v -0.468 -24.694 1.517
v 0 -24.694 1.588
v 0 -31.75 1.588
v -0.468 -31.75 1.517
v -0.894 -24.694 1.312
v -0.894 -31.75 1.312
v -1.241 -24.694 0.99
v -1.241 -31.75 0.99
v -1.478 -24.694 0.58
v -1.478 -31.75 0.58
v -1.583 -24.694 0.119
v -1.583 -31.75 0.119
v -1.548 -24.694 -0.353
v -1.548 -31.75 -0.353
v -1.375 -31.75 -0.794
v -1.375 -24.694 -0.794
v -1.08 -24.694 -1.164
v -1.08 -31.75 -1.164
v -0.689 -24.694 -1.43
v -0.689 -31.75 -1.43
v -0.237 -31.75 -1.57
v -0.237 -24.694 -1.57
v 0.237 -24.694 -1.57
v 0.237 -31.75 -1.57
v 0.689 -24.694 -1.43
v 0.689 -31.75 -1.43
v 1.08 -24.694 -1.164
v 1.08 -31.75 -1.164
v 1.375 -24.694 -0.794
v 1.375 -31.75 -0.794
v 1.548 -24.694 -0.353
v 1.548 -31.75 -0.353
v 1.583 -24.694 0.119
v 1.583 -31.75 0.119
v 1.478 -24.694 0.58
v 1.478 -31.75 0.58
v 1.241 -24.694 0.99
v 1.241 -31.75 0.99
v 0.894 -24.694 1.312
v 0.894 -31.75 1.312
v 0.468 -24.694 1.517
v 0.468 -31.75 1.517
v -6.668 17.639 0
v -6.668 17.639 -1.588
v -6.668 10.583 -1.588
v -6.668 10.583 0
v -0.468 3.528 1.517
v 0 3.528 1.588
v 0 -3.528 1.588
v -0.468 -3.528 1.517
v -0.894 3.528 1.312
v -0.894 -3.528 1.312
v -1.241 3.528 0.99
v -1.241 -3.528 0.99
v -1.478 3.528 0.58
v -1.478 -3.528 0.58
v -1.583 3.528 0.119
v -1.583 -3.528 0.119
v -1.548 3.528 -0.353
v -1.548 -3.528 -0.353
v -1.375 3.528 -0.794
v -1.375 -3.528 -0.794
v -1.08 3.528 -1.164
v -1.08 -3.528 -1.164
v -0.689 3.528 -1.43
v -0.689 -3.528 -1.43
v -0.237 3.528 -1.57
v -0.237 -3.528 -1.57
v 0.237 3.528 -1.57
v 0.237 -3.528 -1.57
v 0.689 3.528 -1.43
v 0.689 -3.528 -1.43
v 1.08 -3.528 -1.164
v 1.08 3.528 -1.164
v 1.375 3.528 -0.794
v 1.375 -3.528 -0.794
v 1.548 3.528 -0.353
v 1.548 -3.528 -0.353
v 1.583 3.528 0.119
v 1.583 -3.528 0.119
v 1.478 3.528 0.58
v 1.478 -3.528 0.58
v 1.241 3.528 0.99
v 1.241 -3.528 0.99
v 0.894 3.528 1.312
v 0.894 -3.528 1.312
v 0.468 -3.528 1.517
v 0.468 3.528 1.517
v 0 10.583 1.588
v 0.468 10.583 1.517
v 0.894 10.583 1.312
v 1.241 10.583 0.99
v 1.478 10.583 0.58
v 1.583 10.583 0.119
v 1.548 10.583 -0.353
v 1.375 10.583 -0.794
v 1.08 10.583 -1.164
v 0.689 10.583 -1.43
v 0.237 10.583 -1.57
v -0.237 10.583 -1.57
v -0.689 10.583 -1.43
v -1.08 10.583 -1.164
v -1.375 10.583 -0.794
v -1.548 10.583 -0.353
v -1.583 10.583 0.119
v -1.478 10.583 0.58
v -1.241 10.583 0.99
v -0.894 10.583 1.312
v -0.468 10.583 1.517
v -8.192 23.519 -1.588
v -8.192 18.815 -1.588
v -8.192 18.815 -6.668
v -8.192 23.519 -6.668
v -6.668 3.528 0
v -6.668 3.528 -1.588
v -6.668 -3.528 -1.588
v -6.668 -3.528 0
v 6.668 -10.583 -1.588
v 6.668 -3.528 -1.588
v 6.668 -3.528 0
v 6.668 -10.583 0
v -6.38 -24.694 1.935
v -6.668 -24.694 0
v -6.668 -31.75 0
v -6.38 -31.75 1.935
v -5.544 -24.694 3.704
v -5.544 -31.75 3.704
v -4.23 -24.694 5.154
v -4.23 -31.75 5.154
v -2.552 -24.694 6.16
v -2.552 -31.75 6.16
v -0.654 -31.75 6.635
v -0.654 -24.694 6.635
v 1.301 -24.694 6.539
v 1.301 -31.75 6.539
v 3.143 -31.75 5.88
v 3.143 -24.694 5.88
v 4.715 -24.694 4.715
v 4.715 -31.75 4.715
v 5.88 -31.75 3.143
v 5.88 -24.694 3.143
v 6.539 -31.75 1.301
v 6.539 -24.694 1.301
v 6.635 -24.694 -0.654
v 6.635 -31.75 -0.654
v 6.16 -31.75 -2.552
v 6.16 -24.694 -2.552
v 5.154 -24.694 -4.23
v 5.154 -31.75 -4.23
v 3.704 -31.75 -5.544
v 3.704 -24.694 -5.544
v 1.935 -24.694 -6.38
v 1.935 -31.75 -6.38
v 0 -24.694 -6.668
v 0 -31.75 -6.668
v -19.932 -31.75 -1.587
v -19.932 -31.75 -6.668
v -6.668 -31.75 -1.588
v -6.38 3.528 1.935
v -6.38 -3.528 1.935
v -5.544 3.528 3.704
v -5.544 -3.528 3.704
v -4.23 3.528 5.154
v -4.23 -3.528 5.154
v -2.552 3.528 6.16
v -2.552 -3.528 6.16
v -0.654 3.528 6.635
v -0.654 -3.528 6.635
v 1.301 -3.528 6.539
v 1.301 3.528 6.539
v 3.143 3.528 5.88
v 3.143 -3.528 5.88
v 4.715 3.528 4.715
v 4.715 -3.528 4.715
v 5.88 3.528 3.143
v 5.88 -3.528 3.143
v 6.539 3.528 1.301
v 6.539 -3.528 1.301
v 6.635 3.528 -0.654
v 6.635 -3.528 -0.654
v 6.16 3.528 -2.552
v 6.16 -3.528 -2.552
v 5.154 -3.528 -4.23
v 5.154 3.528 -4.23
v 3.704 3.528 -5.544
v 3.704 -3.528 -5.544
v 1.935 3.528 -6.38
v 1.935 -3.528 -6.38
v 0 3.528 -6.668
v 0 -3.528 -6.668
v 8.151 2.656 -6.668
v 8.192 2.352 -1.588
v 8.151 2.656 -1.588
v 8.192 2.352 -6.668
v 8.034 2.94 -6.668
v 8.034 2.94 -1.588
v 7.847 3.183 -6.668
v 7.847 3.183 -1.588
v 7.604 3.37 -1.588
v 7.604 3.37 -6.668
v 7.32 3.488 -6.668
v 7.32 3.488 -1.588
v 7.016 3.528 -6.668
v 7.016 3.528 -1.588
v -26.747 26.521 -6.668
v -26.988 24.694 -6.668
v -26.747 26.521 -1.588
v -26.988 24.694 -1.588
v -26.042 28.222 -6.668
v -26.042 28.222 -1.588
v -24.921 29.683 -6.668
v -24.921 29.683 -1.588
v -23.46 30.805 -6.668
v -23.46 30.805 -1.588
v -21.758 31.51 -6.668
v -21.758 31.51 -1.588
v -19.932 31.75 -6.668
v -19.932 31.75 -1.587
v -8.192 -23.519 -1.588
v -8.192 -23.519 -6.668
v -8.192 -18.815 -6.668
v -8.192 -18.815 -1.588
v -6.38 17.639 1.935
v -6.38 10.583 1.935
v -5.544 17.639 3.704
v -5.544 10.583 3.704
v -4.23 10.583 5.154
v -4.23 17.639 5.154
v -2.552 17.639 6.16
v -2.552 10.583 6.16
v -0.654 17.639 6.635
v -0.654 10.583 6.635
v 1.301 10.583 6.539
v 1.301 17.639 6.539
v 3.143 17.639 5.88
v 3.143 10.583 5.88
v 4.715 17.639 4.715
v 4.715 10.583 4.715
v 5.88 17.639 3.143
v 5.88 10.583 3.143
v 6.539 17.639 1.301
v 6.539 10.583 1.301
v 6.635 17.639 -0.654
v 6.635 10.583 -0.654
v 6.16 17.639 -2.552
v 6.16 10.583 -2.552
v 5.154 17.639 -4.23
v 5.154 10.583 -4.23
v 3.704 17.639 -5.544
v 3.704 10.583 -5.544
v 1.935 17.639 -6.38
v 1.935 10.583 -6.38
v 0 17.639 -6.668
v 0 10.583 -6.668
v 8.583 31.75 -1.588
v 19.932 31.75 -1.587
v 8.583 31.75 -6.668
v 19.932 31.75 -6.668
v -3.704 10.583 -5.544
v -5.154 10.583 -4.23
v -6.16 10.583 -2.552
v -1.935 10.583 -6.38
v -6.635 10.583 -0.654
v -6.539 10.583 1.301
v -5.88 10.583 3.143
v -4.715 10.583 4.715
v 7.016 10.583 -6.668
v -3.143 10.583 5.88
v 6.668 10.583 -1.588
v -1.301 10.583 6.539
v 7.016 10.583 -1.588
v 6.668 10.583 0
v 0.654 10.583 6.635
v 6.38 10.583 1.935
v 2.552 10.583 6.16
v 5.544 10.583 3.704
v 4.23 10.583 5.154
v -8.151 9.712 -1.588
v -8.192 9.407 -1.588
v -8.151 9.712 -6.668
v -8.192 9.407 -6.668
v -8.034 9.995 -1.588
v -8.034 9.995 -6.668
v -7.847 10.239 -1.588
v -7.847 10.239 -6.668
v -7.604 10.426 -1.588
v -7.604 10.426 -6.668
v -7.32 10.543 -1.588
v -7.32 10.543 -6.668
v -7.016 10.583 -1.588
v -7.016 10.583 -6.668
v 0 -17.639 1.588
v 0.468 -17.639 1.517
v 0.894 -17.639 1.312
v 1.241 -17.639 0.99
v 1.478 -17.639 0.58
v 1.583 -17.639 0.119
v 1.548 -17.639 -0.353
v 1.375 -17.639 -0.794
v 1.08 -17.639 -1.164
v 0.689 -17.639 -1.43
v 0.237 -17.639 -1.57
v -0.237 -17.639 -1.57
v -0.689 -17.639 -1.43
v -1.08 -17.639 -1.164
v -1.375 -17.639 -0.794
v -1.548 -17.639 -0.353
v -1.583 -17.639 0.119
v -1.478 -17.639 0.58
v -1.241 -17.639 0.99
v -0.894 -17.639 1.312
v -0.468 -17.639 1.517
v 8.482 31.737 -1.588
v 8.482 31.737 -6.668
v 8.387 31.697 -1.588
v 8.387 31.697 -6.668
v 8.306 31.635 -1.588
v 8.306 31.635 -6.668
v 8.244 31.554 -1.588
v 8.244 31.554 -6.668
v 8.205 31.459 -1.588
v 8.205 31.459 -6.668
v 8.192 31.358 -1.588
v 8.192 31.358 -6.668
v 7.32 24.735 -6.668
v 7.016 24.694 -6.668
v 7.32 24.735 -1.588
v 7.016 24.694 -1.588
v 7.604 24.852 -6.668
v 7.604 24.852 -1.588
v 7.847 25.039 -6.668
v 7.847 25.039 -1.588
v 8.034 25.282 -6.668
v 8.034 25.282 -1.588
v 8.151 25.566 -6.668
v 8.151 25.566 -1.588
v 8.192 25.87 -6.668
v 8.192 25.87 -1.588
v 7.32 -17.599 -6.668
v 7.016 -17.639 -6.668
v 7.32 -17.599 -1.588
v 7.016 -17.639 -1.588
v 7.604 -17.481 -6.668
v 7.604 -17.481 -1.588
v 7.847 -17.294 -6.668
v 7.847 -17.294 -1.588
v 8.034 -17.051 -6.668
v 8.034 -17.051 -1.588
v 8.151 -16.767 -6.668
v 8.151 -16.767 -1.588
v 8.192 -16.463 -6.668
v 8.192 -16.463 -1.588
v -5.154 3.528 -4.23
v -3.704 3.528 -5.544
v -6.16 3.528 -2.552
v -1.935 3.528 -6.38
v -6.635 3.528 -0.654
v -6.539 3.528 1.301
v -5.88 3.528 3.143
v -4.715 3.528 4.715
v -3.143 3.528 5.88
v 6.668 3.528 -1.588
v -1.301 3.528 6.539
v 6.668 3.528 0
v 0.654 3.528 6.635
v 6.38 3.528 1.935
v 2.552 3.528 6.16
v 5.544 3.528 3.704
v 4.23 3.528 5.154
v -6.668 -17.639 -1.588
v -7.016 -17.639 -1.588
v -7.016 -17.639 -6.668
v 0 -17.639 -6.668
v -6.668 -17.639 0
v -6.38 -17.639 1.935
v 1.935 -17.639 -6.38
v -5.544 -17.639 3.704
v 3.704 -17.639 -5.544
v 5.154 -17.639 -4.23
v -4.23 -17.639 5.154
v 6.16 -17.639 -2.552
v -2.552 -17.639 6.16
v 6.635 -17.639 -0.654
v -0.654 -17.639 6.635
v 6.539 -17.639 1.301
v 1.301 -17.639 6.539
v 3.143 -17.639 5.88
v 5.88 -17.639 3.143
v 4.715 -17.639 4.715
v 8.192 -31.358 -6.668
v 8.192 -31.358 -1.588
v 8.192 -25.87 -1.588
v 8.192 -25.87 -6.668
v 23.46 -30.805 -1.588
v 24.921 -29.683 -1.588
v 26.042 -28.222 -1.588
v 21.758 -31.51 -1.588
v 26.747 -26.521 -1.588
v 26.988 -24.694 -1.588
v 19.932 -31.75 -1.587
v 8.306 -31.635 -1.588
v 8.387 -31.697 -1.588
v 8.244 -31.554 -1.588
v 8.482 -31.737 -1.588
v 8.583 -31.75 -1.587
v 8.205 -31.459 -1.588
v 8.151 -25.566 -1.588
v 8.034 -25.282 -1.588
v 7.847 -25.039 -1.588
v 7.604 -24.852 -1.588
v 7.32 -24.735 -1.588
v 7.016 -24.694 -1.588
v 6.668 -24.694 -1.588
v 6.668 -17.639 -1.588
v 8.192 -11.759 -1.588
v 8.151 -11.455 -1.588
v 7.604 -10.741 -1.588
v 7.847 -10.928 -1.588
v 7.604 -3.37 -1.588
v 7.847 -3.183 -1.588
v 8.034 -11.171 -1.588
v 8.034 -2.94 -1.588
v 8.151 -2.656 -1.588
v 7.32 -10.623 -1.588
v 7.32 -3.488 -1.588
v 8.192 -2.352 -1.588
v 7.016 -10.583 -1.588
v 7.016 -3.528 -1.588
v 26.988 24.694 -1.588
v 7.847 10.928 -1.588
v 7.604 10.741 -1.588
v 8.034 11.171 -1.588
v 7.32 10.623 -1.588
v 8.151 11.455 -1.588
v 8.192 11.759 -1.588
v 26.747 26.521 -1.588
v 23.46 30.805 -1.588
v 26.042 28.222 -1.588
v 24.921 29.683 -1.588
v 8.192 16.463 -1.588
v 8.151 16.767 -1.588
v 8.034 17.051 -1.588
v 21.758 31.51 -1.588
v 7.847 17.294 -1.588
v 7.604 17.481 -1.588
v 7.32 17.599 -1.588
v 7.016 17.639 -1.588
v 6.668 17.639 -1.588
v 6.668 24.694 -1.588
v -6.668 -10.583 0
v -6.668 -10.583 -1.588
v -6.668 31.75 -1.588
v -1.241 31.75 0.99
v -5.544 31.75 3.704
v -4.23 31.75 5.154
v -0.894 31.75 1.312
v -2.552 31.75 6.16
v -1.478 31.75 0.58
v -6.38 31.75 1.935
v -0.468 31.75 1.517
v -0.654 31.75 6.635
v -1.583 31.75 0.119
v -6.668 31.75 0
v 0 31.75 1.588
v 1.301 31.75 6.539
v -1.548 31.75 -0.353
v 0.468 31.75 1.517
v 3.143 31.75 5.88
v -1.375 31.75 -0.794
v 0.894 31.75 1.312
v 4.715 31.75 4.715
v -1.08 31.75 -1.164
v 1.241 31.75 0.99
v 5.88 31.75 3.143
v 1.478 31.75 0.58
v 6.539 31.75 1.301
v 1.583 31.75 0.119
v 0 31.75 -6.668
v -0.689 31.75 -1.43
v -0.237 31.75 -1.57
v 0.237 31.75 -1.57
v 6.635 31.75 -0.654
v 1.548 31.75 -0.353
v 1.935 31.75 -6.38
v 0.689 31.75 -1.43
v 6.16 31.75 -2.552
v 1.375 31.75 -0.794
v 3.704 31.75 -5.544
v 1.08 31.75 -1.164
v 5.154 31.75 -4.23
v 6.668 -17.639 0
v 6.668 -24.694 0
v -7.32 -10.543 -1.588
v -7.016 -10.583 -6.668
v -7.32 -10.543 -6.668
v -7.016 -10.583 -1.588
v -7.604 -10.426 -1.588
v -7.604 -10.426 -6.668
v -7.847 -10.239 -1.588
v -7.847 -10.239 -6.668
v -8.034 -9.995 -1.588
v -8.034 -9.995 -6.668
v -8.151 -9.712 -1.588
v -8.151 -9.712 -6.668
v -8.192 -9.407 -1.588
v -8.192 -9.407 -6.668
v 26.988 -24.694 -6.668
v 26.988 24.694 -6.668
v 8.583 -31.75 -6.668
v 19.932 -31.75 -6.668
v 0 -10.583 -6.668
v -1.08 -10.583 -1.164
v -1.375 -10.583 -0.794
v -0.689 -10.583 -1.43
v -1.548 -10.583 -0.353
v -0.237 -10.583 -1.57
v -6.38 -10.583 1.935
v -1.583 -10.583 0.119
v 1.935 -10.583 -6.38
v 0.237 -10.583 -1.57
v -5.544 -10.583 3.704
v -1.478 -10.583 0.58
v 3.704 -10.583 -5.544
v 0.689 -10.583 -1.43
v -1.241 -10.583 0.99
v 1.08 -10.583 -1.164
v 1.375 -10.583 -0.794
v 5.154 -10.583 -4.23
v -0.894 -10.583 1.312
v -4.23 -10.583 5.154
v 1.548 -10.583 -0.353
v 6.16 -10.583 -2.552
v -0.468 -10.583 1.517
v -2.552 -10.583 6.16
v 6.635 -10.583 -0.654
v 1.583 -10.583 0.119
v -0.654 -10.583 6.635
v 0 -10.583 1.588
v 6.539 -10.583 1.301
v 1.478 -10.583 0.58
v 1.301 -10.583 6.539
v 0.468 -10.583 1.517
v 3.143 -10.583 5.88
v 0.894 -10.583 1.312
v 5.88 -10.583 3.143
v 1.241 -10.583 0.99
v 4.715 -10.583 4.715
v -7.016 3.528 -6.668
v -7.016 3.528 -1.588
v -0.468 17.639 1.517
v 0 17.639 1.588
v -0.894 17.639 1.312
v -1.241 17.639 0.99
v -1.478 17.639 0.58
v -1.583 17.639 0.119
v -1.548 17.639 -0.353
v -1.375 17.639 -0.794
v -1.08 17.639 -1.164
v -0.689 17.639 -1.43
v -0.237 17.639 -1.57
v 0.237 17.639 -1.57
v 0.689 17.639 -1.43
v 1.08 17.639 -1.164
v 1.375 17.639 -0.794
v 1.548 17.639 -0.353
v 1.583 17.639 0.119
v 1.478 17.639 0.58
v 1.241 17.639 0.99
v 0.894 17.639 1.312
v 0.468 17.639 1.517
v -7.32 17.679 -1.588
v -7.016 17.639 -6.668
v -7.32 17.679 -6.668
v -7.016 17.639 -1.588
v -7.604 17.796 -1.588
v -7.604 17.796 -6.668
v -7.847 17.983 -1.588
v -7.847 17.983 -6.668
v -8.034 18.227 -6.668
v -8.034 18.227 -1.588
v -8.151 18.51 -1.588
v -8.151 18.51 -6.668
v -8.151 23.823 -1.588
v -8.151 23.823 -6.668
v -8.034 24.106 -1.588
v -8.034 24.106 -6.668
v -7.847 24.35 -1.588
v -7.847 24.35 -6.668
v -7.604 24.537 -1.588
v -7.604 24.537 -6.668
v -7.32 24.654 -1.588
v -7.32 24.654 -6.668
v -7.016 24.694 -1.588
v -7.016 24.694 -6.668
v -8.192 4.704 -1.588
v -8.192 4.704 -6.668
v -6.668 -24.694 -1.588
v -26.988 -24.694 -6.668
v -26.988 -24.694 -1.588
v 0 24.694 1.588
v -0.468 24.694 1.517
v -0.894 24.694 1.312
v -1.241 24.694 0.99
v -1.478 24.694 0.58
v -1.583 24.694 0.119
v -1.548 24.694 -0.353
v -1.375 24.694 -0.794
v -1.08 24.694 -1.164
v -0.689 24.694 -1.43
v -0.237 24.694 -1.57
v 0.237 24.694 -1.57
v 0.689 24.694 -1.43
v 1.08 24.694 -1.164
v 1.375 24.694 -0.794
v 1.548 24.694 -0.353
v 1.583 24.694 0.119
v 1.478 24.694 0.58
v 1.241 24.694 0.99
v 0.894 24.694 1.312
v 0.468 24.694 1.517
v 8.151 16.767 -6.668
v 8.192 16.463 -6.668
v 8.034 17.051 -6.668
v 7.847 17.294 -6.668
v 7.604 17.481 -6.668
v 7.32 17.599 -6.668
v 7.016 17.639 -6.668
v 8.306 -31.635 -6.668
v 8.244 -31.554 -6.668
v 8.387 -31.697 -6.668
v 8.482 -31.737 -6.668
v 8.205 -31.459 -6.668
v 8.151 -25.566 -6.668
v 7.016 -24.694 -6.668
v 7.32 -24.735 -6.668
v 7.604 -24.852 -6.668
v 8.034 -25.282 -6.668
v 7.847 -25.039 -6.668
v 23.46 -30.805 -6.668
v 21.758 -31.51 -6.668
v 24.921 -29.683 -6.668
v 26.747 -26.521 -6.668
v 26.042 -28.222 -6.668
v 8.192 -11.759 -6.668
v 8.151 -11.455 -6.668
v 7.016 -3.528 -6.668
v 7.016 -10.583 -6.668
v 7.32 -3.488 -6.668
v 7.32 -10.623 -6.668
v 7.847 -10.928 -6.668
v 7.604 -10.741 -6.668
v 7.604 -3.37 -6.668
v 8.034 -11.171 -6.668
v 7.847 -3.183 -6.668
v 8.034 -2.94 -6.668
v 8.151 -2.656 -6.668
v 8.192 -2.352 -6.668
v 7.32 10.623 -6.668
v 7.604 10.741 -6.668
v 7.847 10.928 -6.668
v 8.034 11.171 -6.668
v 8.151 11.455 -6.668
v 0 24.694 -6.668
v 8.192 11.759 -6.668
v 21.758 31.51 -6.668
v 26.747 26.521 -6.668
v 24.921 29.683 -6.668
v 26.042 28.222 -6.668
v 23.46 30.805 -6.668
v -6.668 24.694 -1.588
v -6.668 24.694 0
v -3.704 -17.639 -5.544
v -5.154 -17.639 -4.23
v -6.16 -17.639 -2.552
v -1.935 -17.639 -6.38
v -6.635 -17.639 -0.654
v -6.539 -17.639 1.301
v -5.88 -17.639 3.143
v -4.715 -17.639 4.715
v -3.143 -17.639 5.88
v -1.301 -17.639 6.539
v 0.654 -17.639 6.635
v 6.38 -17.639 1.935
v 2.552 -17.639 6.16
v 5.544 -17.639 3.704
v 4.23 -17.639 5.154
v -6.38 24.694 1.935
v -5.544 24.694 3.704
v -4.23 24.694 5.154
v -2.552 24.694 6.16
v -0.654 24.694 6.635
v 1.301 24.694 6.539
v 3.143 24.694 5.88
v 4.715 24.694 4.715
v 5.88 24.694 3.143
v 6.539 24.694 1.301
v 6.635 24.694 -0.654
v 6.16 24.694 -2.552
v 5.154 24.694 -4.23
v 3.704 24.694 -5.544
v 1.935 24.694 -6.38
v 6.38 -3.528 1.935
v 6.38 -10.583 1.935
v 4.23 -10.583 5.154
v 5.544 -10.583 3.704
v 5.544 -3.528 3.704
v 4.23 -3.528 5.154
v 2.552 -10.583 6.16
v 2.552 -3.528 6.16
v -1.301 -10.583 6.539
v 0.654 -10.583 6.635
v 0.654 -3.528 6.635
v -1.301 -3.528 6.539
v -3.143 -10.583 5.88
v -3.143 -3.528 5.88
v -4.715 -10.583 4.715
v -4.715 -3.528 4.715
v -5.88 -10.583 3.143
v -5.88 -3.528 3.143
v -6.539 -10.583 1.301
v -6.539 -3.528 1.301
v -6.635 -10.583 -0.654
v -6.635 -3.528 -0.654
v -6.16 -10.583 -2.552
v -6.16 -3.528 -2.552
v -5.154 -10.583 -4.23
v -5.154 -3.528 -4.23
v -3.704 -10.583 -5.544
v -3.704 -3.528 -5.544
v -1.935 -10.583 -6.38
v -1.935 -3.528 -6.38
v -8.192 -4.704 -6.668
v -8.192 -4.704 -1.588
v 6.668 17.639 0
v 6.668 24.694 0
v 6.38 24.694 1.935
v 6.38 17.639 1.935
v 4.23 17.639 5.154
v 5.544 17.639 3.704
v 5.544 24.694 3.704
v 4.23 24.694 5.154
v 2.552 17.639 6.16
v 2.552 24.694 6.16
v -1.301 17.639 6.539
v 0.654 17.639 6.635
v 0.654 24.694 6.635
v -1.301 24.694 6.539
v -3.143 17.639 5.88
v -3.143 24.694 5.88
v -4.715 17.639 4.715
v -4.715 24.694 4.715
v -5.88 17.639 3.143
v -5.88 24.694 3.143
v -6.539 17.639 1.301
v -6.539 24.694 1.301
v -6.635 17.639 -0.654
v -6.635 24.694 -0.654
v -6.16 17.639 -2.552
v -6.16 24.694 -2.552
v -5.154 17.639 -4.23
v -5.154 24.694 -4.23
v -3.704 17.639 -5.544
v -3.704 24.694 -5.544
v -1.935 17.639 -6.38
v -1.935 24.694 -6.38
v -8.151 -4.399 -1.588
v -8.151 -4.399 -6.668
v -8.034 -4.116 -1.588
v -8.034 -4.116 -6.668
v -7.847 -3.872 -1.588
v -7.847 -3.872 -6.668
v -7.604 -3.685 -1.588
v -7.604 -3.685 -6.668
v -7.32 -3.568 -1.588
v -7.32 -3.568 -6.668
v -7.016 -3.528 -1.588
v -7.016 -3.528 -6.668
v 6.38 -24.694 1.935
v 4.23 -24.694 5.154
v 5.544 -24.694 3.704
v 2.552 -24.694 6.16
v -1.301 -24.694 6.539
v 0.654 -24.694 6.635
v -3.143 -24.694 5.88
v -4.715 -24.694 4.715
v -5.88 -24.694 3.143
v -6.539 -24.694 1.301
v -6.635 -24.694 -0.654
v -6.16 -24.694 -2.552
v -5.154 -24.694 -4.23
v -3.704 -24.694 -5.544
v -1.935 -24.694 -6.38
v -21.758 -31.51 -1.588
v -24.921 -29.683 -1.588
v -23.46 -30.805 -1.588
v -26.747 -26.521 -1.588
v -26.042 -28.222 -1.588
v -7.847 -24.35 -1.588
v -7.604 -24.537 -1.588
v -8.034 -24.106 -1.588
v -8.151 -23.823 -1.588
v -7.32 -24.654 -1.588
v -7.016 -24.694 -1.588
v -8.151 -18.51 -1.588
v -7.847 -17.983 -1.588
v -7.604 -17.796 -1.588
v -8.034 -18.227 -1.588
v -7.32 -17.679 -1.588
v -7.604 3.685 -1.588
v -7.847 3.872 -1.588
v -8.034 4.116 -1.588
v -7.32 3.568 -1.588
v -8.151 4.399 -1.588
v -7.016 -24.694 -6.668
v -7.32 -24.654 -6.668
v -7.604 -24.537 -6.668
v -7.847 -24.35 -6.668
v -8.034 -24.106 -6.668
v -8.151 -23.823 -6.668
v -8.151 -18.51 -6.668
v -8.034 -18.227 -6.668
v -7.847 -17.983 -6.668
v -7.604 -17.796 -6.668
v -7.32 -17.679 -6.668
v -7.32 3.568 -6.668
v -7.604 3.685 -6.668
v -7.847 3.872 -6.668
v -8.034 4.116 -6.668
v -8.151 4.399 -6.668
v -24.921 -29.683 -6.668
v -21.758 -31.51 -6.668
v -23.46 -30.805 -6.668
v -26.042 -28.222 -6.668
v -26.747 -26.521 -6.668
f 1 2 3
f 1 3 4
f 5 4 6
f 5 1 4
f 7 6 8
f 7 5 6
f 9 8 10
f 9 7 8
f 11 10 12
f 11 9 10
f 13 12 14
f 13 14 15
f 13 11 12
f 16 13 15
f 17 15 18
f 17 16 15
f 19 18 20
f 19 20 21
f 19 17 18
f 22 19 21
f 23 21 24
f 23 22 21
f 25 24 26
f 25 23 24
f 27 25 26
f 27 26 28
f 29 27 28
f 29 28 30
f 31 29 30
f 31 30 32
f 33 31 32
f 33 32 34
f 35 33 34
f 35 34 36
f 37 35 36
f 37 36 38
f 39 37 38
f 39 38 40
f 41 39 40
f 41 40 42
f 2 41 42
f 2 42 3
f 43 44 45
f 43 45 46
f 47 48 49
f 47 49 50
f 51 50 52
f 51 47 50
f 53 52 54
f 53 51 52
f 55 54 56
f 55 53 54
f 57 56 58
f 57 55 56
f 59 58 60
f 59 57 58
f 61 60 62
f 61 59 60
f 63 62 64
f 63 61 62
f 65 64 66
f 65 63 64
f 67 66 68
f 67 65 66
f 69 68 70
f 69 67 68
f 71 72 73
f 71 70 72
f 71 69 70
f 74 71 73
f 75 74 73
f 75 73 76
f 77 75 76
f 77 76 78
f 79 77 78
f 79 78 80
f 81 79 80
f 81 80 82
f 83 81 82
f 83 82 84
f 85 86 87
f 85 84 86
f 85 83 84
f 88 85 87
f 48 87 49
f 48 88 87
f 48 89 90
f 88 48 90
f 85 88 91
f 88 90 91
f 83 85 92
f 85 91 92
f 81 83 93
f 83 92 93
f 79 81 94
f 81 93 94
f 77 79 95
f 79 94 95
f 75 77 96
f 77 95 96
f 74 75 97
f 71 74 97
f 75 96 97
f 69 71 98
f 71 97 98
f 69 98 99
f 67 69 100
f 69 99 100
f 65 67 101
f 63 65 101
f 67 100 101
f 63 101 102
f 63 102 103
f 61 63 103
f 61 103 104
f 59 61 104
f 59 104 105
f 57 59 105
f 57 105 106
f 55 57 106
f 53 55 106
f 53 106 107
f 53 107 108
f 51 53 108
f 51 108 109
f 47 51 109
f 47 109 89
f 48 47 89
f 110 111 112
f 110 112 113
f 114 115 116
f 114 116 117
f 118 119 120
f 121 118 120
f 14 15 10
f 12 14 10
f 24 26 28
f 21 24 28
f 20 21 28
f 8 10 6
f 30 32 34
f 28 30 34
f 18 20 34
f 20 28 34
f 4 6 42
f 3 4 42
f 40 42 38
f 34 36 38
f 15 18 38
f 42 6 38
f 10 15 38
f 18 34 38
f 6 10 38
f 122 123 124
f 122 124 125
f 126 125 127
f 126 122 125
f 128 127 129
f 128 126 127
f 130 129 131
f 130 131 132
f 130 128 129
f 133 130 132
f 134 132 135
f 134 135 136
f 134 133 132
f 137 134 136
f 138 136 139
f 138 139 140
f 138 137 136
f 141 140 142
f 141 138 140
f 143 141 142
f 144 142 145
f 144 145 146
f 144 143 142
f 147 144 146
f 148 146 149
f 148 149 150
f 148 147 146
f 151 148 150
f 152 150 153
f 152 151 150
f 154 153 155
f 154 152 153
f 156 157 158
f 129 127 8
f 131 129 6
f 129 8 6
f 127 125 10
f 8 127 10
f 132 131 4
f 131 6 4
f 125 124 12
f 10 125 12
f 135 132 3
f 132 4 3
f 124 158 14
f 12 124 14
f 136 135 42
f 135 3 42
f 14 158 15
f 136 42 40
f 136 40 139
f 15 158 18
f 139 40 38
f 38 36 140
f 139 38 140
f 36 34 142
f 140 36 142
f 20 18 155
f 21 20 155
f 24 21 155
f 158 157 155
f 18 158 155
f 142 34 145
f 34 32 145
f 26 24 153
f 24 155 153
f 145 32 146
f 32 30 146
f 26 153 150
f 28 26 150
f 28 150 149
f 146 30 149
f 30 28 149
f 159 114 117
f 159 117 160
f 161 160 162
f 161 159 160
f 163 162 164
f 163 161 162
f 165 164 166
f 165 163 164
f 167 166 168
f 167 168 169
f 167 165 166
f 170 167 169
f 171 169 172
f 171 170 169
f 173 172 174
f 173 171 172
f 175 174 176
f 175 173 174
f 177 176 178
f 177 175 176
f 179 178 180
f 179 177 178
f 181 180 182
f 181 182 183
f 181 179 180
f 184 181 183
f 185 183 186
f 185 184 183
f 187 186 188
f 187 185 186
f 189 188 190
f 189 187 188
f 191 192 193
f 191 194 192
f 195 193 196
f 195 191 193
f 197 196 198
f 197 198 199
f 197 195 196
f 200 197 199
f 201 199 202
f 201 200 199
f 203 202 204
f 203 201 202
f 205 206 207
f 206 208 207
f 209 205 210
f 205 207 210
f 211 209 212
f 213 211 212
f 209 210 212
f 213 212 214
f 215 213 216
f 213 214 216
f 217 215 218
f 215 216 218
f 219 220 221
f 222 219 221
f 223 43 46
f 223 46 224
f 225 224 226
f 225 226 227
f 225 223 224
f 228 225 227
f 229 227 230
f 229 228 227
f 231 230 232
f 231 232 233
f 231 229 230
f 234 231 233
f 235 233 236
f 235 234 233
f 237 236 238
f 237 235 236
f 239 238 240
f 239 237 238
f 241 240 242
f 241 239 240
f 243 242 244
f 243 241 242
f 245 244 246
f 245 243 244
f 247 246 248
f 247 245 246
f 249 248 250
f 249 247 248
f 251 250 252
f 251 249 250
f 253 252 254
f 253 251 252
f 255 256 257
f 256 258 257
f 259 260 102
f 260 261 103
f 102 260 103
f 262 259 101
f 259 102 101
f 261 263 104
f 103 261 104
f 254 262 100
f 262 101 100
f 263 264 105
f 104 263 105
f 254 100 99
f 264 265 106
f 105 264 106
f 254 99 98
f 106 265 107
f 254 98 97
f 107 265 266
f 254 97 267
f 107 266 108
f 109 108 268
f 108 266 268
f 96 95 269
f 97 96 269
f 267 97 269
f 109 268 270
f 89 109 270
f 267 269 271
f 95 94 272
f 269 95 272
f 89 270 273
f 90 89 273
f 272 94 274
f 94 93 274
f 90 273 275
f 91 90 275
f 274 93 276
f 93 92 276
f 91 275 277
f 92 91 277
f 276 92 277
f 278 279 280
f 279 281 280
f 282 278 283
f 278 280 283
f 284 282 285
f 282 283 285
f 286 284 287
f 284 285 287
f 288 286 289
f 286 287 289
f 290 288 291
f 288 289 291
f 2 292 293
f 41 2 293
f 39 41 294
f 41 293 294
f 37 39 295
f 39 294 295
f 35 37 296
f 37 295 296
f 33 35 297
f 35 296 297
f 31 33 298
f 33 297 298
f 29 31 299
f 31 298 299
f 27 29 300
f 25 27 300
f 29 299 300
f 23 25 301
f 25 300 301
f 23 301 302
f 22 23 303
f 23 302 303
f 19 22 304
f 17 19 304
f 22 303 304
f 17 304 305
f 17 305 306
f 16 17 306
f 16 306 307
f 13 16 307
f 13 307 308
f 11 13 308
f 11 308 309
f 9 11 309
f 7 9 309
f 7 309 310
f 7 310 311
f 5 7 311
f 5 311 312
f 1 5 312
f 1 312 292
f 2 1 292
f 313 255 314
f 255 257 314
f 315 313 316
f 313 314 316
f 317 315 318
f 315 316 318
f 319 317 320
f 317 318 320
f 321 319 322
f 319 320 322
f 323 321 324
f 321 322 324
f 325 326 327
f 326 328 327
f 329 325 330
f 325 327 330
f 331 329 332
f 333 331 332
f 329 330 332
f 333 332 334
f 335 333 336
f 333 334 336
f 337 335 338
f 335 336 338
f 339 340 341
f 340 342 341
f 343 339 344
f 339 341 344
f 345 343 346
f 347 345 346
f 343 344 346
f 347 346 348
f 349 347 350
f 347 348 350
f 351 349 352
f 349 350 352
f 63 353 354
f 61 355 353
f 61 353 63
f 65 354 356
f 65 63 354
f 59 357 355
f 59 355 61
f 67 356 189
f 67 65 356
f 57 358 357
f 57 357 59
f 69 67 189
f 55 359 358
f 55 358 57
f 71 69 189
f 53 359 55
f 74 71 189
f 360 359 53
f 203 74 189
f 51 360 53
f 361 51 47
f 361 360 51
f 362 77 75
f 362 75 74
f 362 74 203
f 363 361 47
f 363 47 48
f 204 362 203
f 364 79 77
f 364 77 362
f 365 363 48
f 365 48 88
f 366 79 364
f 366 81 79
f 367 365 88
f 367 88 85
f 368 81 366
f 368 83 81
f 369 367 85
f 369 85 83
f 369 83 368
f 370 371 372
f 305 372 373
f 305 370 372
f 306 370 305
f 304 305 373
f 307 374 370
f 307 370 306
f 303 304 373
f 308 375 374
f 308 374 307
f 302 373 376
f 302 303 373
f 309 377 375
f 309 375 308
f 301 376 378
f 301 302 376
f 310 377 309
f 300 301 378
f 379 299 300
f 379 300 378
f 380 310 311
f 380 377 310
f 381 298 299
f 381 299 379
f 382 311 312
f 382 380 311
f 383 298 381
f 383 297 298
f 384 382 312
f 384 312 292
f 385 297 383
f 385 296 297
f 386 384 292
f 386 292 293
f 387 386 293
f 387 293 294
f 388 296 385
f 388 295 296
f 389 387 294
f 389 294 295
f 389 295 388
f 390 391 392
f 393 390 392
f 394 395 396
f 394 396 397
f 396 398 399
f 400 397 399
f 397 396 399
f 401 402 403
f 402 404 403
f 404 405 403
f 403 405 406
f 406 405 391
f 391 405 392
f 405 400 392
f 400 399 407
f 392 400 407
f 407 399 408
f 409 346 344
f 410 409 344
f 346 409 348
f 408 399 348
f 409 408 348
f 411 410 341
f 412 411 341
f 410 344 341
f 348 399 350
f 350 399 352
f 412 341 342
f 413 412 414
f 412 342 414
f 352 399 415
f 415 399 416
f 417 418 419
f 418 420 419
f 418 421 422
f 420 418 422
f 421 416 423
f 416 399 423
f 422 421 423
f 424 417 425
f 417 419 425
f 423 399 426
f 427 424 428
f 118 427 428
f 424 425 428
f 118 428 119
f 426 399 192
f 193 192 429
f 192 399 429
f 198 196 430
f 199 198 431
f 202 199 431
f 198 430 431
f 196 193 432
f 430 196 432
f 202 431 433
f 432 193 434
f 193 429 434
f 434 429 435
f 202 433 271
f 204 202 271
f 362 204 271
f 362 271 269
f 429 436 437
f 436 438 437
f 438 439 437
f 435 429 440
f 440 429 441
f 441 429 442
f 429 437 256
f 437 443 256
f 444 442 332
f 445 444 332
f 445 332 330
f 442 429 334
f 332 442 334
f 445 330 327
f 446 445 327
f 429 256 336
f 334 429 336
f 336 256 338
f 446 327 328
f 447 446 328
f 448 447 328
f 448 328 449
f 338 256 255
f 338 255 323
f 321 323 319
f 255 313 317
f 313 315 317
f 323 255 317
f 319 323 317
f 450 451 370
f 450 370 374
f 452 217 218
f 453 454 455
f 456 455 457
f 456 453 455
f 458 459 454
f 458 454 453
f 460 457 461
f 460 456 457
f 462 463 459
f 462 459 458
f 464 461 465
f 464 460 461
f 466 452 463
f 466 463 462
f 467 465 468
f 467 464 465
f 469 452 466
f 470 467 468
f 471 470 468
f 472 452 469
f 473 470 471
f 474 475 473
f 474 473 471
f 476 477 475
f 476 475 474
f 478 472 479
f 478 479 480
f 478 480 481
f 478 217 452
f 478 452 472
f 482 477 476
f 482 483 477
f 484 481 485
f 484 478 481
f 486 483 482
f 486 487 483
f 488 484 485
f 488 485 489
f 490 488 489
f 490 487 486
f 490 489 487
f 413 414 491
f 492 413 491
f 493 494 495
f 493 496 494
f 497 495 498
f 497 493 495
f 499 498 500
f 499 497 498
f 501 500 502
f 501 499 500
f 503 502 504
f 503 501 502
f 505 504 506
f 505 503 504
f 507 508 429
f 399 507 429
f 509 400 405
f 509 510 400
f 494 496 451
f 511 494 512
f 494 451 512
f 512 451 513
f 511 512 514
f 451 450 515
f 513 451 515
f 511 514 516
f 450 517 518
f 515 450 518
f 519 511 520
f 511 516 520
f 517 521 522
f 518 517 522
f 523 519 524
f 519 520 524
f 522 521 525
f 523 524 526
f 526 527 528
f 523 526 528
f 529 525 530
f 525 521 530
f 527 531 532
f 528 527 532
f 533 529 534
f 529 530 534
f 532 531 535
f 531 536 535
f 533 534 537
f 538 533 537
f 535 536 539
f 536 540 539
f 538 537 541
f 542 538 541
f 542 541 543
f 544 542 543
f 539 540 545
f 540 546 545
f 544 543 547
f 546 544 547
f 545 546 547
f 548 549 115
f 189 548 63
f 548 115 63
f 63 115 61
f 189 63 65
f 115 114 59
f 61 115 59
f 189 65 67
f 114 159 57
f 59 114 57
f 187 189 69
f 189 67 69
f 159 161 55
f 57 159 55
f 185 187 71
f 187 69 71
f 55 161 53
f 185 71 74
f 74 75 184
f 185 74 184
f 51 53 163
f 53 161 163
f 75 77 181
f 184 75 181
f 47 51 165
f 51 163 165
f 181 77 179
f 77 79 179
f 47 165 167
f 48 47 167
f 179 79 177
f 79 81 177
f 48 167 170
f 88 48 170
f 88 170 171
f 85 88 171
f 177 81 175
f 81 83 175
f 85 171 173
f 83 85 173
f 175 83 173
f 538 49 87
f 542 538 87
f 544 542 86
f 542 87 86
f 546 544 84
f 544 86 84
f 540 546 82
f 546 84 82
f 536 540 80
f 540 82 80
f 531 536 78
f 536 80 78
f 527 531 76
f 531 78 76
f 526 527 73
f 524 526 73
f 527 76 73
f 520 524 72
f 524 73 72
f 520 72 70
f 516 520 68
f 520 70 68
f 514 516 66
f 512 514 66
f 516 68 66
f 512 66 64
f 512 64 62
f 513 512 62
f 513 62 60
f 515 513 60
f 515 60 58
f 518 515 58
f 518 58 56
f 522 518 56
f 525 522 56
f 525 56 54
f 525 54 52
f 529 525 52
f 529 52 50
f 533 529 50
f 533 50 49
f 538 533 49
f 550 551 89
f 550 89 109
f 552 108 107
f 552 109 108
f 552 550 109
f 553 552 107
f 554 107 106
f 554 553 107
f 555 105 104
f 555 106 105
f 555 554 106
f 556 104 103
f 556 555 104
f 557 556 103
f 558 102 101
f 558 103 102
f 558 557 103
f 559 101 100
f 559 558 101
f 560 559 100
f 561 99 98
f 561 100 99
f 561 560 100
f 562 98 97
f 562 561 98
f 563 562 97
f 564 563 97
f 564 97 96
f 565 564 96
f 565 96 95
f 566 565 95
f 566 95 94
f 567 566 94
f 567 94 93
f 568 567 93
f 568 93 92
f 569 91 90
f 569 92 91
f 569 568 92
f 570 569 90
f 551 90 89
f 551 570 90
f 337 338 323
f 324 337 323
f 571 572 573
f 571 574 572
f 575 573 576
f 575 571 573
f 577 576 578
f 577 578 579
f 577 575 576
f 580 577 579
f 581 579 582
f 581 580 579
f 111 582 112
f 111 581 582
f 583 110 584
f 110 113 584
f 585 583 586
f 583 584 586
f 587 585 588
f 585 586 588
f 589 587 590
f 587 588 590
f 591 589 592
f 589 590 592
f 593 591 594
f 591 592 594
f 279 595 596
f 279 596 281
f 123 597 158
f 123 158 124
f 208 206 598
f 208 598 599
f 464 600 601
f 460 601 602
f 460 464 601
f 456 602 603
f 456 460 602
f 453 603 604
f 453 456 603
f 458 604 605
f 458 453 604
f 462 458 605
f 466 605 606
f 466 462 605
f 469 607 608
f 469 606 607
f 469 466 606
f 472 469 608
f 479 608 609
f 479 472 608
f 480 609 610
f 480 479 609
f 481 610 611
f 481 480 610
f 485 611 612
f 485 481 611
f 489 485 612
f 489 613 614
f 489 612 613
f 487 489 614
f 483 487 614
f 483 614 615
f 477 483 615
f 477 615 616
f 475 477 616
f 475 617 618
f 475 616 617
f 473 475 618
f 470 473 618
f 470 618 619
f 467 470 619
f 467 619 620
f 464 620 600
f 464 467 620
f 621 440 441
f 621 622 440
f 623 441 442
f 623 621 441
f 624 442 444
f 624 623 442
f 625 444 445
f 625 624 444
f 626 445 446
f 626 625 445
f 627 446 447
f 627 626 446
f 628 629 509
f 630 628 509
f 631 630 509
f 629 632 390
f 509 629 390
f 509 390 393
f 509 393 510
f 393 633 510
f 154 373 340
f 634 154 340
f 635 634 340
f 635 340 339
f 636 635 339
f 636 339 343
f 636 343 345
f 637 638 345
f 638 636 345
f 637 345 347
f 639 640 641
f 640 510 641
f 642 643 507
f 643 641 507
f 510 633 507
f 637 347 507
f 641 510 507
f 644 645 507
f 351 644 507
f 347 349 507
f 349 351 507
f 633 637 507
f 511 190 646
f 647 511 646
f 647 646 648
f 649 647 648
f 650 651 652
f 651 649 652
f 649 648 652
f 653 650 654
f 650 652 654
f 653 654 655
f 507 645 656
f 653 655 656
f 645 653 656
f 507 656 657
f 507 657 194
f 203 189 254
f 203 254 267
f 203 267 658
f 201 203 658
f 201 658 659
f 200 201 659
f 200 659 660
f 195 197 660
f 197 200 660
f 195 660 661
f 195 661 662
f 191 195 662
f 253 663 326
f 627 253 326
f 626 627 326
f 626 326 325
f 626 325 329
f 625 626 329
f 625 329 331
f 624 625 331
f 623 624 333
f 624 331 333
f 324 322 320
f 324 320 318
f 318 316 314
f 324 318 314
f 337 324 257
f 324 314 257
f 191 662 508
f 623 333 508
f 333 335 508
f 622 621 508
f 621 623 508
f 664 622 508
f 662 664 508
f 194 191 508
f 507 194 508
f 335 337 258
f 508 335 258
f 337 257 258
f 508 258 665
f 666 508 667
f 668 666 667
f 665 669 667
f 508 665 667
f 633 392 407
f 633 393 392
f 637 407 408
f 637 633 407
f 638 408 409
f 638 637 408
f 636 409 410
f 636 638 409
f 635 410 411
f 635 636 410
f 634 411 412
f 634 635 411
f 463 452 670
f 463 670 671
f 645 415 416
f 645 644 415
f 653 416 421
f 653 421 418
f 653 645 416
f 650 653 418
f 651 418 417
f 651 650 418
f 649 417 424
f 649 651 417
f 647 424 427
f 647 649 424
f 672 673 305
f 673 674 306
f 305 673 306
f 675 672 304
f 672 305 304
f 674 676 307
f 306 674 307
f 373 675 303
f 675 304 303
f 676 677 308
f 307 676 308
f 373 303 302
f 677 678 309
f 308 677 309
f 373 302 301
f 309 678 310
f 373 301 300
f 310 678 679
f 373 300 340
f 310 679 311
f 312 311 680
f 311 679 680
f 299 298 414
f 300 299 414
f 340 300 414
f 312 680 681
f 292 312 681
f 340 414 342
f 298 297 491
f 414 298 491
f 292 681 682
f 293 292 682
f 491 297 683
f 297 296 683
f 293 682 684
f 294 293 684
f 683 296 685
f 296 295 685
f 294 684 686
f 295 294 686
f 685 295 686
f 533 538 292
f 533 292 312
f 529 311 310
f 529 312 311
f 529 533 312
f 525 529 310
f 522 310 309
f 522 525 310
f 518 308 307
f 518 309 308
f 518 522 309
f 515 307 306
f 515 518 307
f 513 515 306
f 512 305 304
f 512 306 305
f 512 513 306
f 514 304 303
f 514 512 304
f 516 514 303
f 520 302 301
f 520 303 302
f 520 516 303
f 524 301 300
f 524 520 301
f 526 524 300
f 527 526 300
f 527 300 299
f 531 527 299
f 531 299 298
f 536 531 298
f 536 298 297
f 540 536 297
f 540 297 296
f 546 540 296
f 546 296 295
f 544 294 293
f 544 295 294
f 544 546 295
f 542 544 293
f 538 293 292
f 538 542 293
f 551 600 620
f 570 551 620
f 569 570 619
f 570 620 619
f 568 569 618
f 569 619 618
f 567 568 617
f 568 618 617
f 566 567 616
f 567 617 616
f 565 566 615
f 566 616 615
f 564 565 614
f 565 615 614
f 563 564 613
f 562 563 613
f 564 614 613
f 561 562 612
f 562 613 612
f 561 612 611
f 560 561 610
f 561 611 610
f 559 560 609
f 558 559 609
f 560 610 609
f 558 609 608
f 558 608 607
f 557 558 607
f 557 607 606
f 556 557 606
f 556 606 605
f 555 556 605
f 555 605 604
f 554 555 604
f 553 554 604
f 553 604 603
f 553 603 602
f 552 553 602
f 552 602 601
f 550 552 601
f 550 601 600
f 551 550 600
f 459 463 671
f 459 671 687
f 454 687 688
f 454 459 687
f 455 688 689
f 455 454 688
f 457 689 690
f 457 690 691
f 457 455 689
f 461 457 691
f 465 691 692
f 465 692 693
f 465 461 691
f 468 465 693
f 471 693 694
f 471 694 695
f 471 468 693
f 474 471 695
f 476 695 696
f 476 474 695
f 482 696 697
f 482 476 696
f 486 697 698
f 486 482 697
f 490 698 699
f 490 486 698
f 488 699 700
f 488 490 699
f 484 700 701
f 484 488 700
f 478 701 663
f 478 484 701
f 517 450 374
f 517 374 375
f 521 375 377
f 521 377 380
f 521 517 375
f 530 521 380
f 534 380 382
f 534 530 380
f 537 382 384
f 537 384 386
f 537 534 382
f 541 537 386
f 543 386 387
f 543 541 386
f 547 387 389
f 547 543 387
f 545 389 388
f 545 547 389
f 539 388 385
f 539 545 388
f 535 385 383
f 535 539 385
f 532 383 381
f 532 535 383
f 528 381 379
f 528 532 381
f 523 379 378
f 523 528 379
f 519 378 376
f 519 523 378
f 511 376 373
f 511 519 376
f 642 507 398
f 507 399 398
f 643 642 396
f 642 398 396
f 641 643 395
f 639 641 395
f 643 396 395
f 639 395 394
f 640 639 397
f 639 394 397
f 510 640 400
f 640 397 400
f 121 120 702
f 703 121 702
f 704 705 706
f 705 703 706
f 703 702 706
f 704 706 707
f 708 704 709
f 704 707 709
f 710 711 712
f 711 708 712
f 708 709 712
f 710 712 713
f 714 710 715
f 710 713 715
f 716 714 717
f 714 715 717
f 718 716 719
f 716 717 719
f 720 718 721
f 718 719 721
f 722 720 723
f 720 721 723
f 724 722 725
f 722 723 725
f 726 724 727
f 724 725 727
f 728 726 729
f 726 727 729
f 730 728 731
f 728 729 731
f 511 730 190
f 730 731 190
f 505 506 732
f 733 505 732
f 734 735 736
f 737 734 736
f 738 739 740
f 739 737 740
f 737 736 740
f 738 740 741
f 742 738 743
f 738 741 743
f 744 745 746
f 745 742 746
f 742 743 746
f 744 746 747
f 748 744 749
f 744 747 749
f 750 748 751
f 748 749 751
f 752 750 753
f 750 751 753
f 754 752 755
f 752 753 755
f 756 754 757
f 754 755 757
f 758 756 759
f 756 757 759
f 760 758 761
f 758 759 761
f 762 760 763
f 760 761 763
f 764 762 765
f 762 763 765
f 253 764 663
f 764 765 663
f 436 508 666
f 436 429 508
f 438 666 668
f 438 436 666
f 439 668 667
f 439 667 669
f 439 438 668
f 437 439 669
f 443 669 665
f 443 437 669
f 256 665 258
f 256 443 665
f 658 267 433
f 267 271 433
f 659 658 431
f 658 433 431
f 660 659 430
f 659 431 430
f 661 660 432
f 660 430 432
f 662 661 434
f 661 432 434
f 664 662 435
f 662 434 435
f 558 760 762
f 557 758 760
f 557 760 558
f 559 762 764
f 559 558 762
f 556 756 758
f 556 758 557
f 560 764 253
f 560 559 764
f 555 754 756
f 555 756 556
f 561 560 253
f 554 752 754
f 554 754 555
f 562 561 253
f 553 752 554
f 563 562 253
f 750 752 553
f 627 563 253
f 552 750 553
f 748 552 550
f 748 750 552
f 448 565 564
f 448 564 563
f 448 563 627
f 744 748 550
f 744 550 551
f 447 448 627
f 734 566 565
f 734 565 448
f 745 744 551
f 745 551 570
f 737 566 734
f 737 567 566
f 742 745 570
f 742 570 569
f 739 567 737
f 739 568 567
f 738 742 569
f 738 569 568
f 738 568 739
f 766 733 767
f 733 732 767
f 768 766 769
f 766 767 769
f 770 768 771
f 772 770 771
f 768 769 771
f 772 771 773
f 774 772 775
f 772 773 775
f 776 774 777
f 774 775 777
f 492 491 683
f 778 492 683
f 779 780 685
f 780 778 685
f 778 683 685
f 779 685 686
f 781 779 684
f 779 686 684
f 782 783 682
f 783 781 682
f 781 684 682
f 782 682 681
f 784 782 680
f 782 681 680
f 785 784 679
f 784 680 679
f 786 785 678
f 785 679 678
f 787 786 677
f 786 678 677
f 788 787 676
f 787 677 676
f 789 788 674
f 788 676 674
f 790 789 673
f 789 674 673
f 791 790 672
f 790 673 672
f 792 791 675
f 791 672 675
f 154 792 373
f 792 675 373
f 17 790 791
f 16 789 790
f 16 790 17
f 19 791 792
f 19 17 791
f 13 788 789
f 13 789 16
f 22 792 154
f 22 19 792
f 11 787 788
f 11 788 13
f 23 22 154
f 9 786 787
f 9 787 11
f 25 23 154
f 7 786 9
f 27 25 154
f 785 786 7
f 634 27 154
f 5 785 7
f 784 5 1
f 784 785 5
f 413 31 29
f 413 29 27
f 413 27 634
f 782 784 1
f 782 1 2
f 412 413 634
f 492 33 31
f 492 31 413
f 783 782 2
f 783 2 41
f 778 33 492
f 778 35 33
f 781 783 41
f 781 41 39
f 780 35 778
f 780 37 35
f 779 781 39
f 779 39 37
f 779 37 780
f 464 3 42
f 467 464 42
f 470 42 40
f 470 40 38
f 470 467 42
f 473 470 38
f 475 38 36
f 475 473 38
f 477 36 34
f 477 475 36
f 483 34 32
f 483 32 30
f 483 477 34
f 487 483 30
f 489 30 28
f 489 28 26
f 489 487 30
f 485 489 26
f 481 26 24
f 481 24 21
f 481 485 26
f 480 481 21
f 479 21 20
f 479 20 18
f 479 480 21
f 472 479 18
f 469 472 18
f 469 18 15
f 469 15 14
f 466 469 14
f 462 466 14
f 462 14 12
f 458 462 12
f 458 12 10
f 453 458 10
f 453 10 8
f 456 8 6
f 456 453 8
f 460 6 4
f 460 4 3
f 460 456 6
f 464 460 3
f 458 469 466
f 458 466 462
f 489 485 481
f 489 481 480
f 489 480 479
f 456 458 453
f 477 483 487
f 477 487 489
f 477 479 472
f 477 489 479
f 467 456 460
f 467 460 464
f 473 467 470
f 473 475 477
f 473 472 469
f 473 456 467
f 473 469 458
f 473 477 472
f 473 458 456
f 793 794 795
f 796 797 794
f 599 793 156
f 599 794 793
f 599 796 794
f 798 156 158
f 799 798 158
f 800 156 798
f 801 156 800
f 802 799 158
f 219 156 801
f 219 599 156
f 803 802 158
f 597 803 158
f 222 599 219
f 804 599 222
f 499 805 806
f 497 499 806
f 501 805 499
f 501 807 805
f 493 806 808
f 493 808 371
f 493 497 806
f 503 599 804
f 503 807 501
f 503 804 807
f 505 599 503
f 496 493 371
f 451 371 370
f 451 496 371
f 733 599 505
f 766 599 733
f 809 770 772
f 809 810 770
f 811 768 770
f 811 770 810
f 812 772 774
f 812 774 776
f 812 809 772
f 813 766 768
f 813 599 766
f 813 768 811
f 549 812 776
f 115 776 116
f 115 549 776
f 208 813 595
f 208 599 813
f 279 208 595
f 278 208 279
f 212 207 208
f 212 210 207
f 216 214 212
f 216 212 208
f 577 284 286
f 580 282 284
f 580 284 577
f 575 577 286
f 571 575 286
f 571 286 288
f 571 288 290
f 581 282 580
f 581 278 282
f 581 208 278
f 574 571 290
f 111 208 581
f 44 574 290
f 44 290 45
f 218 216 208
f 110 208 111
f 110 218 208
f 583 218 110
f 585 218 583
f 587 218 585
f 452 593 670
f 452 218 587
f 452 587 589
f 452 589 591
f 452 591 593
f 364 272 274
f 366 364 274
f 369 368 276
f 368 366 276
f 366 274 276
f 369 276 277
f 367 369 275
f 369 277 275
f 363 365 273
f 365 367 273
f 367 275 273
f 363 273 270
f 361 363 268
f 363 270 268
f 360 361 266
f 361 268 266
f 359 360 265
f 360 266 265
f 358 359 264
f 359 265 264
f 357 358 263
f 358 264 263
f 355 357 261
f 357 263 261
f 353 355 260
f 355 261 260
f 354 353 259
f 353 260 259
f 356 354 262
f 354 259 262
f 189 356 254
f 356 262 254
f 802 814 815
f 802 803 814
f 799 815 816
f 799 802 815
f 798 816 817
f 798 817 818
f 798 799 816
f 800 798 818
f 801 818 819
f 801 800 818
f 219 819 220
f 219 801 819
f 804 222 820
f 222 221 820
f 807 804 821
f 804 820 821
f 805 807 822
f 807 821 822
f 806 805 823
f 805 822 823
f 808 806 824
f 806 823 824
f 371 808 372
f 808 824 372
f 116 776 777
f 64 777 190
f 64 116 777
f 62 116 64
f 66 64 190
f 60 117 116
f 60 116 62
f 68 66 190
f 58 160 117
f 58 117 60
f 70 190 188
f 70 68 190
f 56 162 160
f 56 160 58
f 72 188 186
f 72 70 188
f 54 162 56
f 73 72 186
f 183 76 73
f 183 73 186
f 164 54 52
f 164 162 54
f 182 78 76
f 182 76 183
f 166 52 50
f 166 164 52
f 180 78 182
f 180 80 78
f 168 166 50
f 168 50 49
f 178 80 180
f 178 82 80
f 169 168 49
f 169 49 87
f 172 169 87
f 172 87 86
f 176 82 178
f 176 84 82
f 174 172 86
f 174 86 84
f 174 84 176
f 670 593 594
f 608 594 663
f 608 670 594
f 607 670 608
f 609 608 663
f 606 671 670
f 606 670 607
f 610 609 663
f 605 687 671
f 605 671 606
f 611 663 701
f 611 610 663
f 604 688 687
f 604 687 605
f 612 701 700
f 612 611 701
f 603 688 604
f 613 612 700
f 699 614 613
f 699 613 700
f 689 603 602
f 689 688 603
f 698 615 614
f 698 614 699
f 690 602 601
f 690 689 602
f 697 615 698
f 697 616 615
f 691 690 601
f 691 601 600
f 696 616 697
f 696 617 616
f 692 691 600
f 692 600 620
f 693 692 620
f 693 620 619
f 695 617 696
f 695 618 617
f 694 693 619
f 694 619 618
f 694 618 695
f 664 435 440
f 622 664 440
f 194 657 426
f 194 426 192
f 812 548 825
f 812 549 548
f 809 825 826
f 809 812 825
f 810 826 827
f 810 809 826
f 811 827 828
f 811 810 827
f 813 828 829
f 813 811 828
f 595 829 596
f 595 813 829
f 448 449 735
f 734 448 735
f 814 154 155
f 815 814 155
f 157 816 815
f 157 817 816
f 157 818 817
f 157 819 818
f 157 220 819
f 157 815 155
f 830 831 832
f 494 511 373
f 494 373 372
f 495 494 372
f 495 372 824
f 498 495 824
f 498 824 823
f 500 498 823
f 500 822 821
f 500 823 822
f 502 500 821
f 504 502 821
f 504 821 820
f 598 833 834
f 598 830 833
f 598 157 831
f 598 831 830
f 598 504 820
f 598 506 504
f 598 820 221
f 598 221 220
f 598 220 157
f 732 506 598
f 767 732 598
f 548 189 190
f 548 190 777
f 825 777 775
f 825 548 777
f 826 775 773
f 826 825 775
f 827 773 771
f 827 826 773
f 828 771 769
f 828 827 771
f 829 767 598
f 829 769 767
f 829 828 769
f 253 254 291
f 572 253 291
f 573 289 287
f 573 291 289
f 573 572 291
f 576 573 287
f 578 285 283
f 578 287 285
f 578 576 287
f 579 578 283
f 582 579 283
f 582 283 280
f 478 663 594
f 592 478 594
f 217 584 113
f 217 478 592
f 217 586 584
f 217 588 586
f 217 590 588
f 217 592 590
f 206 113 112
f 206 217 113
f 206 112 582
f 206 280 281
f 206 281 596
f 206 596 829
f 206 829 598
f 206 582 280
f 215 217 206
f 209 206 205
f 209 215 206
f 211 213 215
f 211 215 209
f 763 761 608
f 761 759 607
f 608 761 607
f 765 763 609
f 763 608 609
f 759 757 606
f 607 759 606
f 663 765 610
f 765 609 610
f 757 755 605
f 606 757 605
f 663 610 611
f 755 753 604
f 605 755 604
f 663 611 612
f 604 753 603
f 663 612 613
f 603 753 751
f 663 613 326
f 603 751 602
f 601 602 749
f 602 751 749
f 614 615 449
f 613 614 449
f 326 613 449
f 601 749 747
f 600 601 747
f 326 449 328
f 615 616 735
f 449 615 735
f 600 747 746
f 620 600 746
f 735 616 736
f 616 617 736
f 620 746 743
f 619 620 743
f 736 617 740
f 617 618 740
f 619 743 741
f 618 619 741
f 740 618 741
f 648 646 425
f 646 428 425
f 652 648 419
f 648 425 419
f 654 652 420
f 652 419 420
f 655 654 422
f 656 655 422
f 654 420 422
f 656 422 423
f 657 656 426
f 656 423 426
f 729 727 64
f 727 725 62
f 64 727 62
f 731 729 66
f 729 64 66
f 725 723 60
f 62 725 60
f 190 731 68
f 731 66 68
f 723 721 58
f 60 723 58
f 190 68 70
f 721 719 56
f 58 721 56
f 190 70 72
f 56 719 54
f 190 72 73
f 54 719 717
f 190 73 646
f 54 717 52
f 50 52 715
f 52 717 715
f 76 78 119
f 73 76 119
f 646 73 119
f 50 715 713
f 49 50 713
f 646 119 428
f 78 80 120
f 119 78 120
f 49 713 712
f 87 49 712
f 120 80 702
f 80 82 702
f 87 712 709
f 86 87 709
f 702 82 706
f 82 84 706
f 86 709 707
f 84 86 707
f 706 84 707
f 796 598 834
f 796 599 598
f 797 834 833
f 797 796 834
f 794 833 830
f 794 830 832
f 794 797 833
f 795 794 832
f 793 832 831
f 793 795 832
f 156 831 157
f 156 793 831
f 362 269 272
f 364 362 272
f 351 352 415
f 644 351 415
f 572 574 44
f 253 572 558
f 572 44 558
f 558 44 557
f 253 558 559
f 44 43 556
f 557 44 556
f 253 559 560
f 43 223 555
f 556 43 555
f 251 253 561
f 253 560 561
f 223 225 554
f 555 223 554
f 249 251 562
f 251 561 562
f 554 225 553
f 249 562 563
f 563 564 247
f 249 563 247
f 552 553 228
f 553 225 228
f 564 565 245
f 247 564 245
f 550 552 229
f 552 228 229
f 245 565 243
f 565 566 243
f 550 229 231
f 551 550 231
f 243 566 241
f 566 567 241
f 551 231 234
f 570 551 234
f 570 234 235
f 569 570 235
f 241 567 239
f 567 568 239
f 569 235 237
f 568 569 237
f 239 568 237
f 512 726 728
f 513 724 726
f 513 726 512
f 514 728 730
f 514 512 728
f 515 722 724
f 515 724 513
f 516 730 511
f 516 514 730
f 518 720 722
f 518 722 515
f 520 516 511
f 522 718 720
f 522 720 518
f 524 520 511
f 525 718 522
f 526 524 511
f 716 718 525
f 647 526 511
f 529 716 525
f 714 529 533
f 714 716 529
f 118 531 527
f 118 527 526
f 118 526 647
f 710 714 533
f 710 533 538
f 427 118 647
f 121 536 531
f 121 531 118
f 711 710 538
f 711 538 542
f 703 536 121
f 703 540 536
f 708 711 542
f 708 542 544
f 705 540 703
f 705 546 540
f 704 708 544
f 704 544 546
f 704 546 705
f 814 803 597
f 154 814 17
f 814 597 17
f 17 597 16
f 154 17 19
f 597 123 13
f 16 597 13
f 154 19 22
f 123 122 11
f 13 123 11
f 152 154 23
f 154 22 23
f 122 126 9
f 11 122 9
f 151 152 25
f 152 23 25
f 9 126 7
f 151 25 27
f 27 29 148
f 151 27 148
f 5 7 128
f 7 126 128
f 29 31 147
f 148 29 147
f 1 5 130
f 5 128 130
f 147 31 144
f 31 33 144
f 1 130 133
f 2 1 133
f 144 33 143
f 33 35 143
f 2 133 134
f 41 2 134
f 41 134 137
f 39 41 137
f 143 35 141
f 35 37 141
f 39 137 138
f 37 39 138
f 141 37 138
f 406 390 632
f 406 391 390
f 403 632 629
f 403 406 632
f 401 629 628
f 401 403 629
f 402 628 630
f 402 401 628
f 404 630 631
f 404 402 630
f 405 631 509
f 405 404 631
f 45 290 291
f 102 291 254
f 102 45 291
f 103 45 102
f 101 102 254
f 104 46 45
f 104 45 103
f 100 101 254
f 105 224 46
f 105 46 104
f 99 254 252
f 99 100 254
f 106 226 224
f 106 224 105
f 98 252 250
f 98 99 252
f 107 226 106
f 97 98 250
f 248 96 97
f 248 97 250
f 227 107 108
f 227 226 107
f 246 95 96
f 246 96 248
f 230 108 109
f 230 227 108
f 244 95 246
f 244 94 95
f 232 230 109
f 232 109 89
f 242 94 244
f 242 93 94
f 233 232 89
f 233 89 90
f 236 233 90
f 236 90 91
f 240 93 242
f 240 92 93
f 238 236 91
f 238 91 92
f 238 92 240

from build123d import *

# Parameters (mm, degrees)
BOSS_EXTRUDE1_START = 31.75
SKETCH3_R           = 1.5875
BOSS_EXTRUDE1_DEPTH = 63.5
FILLET1_R           = 7.055555556
SKETCH5_W           = 16.383
SKETCH5_H           = 7.055555556
CUT_EXTRUDE1_DEPTH  = 43.200038063
LPATTERN1_COUNT     = 5
LPATTERN1_PITCH     = 14.111111111
FILLET2_R           = 1.175925926
SKETCH6_W           = 16.383
SKETCH6_H           = 7.055555555
CUT_EXTRUDE2_DEPTH  = 43.200038063
LPATTERN2_COUNT     = 4
LPATTERN2_PITCH     = 14.111111111
FILLET3_R           = 1.175925926
FILLET4_R           = 0.391975309
BOSS_EXTRUDE3_START = 31.75
SKETCH7_R           = 1.5875
BOSS_EXTRUDE3_DEPTH = 63.5


with BuildPart() as part:
    # Sketch3 → Boss-Extrude1 (new body)
    with BuildSketch(Plane(origin=(0, 0, 0), x_dir=(1, 0, 0), z_dir=(0, 1, 0)).offset(BOSS_EXTRUDE1_START)):
        with BuildLine():
            Line((26.9875, 6.6675), (26.9875, 1.5875))
            Line((26.9875, 1.5875), (6.6675, 1.5875))
            Line((6.6675, 1.5875), (6.6675, 0))
            ThreePointArc((6.6675, 0), (-4.714634464, -4.714634464), (0, 6.6675))
            Line((0, 6.6675), (26.9875, 6.6675))
        make_face()
        with Locations(Location((0, 0, 0), (0, 0, 270))):
            Circle(SKETCH3_R, mode=Mode.SUBTRACT)
    extrude(amount=-BOSS_EXTRUDE1_DEPTH)

    # Fillet1
    fillet1_edges = [part.edges().sort_by_distance(p)[0] for p in [
        (26.9875, -31.75, -4.1275),
        (26.9875, 31.75, -4.1275),
    ]]
    fillet(fillet1_edges, radius=FILLET1_R)


with BuildPart() as body_2:
    # Mirror1: mirrored copy
    add(part.part.mirror(Plane(origin=(0, 0, 0), x_dir=(0, 0, 1), z_dir=(1, 0, 0))))

    # Sketch6 → Cut-Extrude2 (cut, symmetric)
    with BuildSketch(Plane.XY):
        with Locations((0, 21.166666666)):
            Rectangle(SKETCH6_W, SKETCH6_H)
    cut_extrude2 = extrude(amount=CUT_EXTRUDE2_DEPTH, both=True, mode=Mode.SUBTRACT)

    # LPattern2: Cut-Extrude2 ×4
    with Locations(*[(0, -i * LPATTERN2_PITCH, 0) for i in range(1, LPATTERN2_COUNT)]):
        add(cut_extrude2, mode=Mode.SUBTRACT)

    # Fillet3
    fillet3_edges = [body_2.edges().sort_by_distance(p)[0] for p in [
        (-8.1915, -3.527777778, -4.1275),
        (-8.1915, -10.583333333, -4.1275),
        (-8.1915, -17.638888889, -4.1275),
        (-8.1915, -24.694444444, -4.1275),
        (-8.1915, 24.694444444, -4.1275),
        (-8.1915, 17.638888889, -4.1275),
        (-8.1915, 10.583333333, -4.1275),
        (-8.1915, 3.527777778, -4.1275),
    ]]
    fillet(fillet3_edges, radius=FILLET3_R)


with BuildPart() as part_1:
    add(part.part)

    # Sketch5 → Cut-Extrude1 (cut, symmetric)
    with BuildSketch(Plane.XY):
        with Locations((0, 28.222222222)):
            Rectangle(SKETCH5_W, SKETCH5_H)
    cut_extrude1 = extrude(amount=CUT_EXTRUDE1_DEPTH, both=True, mode=Mode.SUBTRACT)

    # LPattern1: Cut-Extrude1 ×5
    with Locations(*[(0, -i * LPATTERN1_PITCH, 0) for i in range(1, LPATTERN1_COUNT)]):
        add(cut_extrude1, mode=Mode.SUBTRACT)

    # Fillet2
    fillet2_edges = [part_1.edges().sort_by_distance(p)[0] for p in [
        (8.1915, -3.527777778, -4.1275),
        (8.1915, 3.527777778, -4.1275),
        (8.1915, -17.638888889, -4.1275),
        (8.1915, -10.583333333, -4.1275),
        (8.1915, -24.694444444, -4.1275),
        (8.1915, 24.694444444, -4.1275),
        (8.1915, 10.583333333, -4.1275),
        (8.1915, 17.638888889, -4.1275),
    ]]
    fillet(fillet2_edges, radius=FILLET2_R)

    # Fillet4
    fillet4_edges = [part_1.edges().sort_by_distance(p)[0] for p in [
        (8.1915, -31.75, -4.1275),
        (8.1915, 31.75, -4.1275),
    ]]
    fillet(fillet4_edges, radius=FILLET4_R)


with BuildPart() as body_3:
    # Sketch7 → Boss-Extrude3 (new body)
    with BuildSketch(Plane(origin=(0, 0, 0), x_dir=(1, 0, 0), z_dir=(0, 1, 0)).offset(BOSS_EXTRUDE3_START)):
        with Locations(Location((0, 0, 0), (0, 0, 270))):
            Circle(SKETCH7_R)
    extrude(amount=-BOSS_EXTRUDE3_DEPTH)


solid = Compound([body_2.part, part_1.part, body_3.part])
